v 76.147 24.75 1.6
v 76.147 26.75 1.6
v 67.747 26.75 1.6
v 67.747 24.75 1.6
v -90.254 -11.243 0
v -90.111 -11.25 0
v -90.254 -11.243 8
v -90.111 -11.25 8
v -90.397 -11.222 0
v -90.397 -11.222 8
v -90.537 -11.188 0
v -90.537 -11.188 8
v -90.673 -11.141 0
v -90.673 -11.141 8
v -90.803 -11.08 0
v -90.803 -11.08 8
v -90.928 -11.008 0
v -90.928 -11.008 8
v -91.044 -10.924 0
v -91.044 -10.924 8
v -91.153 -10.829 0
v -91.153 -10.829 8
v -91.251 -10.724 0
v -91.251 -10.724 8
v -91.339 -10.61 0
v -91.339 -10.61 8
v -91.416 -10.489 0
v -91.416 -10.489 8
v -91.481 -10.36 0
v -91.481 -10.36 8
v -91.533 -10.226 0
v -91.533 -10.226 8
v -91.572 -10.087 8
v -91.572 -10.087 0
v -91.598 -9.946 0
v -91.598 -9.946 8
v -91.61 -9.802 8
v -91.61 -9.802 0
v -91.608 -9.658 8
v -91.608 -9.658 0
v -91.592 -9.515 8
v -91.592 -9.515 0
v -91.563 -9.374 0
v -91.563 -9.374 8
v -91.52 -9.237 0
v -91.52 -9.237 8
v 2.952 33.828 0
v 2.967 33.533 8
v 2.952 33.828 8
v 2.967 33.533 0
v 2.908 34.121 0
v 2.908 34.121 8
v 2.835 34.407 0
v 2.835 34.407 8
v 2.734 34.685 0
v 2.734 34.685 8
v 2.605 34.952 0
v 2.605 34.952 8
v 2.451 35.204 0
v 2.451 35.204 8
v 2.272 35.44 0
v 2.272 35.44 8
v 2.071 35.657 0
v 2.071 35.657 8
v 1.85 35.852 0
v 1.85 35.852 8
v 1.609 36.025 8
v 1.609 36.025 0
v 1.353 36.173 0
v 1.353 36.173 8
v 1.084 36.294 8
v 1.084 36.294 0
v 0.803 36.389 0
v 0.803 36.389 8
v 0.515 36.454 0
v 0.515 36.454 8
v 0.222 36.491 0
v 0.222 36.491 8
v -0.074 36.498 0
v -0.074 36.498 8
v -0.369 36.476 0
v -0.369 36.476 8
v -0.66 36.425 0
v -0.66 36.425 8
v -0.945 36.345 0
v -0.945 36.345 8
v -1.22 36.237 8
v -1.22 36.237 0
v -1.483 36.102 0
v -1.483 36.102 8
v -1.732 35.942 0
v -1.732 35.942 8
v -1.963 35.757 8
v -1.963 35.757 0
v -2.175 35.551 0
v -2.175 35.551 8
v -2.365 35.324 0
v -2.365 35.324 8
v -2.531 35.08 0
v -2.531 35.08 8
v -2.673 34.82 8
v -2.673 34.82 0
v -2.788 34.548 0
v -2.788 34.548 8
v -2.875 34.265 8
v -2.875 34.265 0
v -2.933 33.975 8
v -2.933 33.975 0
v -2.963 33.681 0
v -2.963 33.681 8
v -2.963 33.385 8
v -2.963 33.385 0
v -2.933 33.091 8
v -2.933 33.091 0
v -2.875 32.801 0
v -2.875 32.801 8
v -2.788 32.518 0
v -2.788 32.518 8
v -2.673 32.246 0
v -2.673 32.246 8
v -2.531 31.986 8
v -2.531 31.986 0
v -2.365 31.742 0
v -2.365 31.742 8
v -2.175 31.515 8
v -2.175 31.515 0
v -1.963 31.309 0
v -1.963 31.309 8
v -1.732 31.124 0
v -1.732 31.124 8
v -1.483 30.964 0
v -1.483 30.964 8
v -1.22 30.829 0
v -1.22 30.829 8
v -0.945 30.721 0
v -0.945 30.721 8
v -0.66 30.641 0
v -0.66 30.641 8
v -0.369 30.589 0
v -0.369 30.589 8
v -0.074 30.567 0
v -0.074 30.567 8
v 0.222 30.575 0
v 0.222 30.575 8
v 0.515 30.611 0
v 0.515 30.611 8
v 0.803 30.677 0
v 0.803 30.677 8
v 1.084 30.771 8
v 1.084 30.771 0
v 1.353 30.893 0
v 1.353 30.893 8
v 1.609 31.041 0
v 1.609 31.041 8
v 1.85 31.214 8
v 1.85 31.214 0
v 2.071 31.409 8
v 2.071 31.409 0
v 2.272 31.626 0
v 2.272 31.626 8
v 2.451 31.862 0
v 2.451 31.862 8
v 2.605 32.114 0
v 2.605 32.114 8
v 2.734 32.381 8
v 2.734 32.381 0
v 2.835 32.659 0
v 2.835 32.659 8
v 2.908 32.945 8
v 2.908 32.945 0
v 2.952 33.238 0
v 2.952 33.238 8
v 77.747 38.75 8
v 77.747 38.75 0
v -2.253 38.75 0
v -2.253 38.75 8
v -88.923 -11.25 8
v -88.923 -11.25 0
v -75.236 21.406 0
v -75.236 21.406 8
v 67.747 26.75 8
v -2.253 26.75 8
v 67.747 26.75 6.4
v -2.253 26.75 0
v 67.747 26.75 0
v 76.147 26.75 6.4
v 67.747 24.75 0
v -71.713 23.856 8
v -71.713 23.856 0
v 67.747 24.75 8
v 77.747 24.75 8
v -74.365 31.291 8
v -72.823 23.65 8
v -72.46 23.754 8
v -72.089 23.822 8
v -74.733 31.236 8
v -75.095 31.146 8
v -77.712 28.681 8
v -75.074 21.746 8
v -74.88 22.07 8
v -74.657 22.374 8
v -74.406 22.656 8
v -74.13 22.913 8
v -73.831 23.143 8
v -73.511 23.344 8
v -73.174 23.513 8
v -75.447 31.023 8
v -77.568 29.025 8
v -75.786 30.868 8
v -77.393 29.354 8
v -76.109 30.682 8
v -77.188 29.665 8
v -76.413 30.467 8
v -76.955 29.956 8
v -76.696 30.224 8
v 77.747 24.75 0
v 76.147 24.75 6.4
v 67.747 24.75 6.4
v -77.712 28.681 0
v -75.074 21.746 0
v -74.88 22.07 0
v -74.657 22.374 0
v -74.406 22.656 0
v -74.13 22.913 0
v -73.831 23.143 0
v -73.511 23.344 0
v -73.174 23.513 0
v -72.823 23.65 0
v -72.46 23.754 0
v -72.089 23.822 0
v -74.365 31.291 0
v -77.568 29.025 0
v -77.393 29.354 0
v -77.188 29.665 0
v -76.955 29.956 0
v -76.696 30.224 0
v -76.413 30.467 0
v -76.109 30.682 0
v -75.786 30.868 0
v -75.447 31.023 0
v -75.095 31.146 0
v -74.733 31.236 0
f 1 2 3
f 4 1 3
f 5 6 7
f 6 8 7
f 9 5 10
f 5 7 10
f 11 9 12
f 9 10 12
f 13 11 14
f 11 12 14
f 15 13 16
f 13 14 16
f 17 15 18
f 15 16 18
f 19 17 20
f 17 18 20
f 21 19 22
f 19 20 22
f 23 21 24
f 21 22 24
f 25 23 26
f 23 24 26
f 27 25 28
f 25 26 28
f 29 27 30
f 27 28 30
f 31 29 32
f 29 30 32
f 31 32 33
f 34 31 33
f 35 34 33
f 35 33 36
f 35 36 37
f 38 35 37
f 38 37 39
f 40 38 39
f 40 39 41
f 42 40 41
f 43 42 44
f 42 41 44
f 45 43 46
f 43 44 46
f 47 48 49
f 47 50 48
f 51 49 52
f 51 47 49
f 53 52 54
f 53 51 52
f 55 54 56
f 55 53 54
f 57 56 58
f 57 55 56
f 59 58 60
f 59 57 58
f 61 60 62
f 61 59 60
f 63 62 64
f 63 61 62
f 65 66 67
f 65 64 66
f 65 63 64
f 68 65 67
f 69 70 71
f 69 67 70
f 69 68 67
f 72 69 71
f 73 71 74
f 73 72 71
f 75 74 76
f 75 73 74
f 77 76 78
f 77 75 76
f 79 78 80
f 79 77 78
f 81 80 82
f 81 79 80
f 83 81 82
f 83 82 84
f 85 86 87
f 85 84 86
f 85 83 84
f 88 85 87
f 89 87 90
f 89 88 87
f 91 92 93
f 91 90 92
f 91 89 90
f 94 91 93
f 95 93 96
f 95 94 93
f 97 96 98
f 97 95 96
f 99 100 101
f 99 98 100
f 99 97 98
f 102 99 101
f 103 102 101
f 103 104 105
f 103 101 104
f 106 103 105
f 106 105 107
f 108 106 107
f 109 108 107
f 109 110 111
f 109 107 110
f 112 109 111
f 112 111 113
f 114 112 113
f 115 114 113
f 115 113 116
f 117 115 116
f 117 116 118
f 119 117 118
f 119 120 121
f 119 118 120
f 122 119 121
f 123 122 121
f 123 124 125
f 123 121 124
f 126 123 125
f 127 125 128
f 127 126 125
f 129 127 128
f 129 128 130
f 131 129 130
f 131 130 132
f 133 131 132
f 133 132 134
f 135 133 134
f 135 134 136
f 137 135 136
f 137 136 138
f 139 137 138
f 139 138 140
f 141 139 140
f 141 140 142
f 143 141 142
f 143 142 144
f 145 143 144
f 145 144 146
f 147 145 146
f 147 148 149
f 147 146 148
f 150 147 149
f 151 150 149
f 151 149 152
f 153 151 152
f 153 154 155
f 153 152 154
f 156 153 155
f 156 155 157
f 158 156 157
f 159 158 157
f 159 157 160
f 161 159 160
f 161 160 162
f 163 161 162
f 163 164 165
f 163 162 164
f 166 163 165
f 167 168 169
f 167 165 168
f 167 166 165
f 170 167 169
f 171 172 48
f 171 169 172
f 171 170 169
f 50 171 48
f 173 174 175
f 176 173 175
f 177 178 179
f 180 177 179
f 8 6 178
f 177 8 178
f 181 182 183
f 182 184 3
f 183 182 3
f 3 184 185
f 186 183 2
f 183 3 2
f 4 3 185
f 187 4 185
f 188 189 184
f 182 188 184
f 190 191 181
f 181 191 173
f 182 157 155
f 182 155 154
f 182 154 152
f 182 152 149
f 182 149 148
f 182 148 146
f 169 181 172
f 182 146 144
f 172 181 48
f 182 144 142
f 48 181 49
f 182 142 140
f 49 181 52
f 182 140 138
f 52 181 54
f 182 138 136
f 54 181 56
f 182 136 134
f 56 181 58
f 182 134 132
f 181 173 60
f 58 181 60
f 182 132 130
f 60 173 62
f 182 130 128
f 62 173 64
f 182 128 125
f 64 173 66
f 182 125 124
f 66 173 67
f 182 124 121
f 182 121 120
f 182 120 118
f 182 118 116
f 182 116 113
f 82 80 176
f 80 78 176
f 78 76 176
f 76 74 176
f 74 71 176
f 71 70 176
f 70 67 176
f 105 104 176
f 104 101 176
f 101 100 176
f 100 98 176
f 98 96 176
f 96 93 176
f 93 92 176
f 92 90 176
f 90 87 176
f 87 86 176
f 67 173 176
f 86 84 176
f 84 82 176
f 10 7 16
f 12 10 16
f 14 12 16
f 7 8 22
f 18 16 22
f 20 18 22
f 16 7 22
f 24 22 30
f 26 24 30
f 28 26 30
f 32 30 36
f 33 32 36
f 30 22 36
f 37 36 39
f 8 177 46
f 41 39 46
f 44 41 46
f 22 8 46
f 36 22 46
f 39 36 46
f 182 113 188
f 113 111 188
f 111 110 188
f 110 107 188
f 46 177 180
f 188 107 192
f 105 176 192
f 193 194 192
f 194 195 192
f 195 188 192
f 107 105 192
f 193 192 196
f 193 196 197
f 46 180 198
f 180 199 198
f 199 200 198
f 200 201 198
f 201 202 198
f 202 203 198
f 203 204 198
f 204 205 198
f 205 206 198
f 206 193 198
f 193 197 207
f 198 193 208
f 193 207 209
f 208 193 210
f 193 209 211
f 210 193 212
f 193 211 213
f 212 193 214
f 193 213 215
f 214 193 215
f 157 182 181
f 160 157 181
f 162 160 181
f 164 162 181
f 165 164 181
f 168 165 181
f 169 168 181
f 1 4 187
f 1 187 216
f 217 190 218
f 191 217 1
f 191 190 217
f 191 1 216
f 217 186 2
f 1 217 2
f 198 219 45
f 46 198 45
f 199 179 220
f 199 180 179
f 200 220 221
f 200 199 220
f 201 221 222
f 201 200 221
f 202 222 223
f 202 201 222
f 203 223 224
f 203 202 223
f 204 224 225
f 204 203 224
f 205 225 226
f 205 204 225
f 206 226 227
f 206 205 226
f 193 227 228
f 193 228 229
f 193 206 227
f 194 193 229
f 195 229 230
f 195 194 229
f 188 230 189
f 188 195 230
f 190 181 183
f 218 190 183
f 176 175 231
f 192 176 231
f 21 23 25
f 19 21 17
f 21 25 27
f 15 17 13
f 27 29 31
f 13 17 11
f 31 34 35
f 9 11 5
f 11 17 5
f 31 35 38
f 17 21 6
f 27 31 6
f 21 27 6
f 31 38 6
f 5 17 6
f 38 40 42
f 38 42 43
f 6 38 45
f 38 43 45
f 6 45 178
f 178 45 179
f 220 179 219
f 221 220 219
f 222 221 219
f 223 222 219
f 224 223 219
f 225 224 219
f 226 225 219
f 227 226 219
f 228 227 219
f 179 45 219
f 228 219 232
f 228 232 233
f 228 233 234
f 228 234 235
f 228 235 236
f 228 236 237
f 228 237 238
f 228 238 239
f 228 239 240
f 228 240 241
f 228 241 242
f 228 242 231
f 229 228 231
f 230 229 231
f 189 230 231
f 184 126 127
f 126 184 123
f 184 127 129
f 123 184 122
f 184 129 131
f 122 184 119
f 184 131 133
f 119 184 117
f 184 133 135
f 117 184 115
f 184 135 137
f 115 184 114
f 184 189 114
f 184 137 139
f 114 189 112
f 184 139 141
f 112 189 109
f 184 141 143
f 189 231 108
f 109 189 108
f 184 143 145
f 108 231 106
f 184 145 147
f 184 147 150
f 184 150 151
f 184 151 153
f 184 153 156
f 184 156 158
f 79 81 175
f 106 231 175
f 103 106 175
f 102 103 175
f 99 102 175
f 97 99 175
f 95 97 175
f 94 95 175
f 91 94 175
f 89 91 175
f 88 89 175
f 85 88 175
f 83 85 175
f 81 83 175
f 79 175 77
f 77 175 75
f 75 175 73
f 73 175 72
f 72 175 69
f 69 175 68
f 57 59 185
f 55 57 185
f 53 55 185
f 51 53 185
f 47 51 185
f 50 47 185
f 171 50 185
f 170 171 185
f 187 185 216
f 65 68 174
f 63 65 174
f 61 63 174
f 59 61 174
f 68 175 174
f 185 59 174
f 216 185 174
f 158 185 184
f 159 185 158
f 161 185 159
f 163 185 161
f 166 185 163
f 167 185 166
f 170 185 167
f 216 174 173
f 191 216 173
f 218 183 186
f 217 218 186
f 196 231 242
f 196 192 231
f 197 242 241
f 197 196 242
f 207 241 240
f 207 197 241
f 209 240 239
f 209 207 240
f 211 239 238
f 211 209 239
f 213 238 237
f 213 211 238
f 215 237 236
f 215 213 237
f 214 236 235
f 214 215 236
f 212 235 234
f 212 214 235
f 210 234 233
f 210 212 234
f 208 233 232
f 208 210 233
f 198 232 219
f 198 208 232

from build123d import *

# Parameters (mm, degrees)
BOSS_EXTRUDE1_DEPTH     = 8
SKETCH6_W               = 1.6
SKETCH6_H               = 2.4
BOSS_EXTRUDE2_DEPTH     = 2
FILLET1_R               = 4
CUT_EXTRUDE1_DEPTH      = 101.380345151
CUT_EXTRUDE1_DEPTH_BACK = 101.380345151
SKETCH7_R               = 2.966503931
FILLET3_R               = 1.5


with BuildPart() as part:
    # Sketch4 → Boss-Extrude1 (new body)
    with BuildSketch(Plane.XY):
        Polygon((77.746809309, 38.75), (-2.253190691, 38.75), (-76.855180537, 31.033581723), (-92.253190691, -11.25), (-88.923190691, -11.25), (-74.253190691, 23.75), (-2.253190691, 26.75), (77.746809309, 26.75), align=None)
    extrude(amount=BOSS_EXTRUDE1_DEPTH)

    # Sketch6 → Boss-Extrude2 (add)
    with BuildSketch(Plane.XZ.offset(-26.75)):
        Polygon((77.746809309, 6.4), (77.746809309, 8), (67.746809309, 8), (67.746809309, 6.4), (76.146809309, 6.4), align=None)
        with Locations((76.946809309, 5.2)):
            Rectangle(SKETCH6_W, SKETCH6_H)
        with Locations((76.946809309, 2.8)):
            Rectangle(SKETCH6_W, SKETCH6_H)
        Polygon((77.746809309, 0), (77.746809309, 1.6), (76.146809309, 1.6), (67.746809309, 1.6), (67.746809309, 0), align=None)
    extrude(amount=BOSS_EXTRUDE2_DEPTH)

    # Fillet1
    fillet1_edges = [part.edges().sort_by_distance(p)[0] for p in [
        (-74.253190691, 23.75, 4),
        (-76.855180537, 31.033581723, 4),
    ]]
    fillet(fillet1_edges, radius=FILLET1_R)

    # Sketch7 → Cut-Extrude1 (cut, two sides: drawn at the far end of the back side and taken through both)
    with BuildSketch(Plane.XY.offset(8).offset(-CUT_EXTRUDE1_DEPTH_BACK)):
        with Locations((0, 33.532902176)):
            Circle(SKETCH7_R)
    extrude(amount=CUT_EXTRUDE1_DEPTH + CUT_EXTRUDE1_DEPTH_BACK, mode=Mode.SUBTRACT)

    # Fillet3
    fillet3_edges = [part.edges().sort_by_distance(p)[0] for p in [
        (-92.253190691, -11.25, 4),
    ]]
    fillet(fillet3_edges, radius=FILLET3_R)


solid = part.part
